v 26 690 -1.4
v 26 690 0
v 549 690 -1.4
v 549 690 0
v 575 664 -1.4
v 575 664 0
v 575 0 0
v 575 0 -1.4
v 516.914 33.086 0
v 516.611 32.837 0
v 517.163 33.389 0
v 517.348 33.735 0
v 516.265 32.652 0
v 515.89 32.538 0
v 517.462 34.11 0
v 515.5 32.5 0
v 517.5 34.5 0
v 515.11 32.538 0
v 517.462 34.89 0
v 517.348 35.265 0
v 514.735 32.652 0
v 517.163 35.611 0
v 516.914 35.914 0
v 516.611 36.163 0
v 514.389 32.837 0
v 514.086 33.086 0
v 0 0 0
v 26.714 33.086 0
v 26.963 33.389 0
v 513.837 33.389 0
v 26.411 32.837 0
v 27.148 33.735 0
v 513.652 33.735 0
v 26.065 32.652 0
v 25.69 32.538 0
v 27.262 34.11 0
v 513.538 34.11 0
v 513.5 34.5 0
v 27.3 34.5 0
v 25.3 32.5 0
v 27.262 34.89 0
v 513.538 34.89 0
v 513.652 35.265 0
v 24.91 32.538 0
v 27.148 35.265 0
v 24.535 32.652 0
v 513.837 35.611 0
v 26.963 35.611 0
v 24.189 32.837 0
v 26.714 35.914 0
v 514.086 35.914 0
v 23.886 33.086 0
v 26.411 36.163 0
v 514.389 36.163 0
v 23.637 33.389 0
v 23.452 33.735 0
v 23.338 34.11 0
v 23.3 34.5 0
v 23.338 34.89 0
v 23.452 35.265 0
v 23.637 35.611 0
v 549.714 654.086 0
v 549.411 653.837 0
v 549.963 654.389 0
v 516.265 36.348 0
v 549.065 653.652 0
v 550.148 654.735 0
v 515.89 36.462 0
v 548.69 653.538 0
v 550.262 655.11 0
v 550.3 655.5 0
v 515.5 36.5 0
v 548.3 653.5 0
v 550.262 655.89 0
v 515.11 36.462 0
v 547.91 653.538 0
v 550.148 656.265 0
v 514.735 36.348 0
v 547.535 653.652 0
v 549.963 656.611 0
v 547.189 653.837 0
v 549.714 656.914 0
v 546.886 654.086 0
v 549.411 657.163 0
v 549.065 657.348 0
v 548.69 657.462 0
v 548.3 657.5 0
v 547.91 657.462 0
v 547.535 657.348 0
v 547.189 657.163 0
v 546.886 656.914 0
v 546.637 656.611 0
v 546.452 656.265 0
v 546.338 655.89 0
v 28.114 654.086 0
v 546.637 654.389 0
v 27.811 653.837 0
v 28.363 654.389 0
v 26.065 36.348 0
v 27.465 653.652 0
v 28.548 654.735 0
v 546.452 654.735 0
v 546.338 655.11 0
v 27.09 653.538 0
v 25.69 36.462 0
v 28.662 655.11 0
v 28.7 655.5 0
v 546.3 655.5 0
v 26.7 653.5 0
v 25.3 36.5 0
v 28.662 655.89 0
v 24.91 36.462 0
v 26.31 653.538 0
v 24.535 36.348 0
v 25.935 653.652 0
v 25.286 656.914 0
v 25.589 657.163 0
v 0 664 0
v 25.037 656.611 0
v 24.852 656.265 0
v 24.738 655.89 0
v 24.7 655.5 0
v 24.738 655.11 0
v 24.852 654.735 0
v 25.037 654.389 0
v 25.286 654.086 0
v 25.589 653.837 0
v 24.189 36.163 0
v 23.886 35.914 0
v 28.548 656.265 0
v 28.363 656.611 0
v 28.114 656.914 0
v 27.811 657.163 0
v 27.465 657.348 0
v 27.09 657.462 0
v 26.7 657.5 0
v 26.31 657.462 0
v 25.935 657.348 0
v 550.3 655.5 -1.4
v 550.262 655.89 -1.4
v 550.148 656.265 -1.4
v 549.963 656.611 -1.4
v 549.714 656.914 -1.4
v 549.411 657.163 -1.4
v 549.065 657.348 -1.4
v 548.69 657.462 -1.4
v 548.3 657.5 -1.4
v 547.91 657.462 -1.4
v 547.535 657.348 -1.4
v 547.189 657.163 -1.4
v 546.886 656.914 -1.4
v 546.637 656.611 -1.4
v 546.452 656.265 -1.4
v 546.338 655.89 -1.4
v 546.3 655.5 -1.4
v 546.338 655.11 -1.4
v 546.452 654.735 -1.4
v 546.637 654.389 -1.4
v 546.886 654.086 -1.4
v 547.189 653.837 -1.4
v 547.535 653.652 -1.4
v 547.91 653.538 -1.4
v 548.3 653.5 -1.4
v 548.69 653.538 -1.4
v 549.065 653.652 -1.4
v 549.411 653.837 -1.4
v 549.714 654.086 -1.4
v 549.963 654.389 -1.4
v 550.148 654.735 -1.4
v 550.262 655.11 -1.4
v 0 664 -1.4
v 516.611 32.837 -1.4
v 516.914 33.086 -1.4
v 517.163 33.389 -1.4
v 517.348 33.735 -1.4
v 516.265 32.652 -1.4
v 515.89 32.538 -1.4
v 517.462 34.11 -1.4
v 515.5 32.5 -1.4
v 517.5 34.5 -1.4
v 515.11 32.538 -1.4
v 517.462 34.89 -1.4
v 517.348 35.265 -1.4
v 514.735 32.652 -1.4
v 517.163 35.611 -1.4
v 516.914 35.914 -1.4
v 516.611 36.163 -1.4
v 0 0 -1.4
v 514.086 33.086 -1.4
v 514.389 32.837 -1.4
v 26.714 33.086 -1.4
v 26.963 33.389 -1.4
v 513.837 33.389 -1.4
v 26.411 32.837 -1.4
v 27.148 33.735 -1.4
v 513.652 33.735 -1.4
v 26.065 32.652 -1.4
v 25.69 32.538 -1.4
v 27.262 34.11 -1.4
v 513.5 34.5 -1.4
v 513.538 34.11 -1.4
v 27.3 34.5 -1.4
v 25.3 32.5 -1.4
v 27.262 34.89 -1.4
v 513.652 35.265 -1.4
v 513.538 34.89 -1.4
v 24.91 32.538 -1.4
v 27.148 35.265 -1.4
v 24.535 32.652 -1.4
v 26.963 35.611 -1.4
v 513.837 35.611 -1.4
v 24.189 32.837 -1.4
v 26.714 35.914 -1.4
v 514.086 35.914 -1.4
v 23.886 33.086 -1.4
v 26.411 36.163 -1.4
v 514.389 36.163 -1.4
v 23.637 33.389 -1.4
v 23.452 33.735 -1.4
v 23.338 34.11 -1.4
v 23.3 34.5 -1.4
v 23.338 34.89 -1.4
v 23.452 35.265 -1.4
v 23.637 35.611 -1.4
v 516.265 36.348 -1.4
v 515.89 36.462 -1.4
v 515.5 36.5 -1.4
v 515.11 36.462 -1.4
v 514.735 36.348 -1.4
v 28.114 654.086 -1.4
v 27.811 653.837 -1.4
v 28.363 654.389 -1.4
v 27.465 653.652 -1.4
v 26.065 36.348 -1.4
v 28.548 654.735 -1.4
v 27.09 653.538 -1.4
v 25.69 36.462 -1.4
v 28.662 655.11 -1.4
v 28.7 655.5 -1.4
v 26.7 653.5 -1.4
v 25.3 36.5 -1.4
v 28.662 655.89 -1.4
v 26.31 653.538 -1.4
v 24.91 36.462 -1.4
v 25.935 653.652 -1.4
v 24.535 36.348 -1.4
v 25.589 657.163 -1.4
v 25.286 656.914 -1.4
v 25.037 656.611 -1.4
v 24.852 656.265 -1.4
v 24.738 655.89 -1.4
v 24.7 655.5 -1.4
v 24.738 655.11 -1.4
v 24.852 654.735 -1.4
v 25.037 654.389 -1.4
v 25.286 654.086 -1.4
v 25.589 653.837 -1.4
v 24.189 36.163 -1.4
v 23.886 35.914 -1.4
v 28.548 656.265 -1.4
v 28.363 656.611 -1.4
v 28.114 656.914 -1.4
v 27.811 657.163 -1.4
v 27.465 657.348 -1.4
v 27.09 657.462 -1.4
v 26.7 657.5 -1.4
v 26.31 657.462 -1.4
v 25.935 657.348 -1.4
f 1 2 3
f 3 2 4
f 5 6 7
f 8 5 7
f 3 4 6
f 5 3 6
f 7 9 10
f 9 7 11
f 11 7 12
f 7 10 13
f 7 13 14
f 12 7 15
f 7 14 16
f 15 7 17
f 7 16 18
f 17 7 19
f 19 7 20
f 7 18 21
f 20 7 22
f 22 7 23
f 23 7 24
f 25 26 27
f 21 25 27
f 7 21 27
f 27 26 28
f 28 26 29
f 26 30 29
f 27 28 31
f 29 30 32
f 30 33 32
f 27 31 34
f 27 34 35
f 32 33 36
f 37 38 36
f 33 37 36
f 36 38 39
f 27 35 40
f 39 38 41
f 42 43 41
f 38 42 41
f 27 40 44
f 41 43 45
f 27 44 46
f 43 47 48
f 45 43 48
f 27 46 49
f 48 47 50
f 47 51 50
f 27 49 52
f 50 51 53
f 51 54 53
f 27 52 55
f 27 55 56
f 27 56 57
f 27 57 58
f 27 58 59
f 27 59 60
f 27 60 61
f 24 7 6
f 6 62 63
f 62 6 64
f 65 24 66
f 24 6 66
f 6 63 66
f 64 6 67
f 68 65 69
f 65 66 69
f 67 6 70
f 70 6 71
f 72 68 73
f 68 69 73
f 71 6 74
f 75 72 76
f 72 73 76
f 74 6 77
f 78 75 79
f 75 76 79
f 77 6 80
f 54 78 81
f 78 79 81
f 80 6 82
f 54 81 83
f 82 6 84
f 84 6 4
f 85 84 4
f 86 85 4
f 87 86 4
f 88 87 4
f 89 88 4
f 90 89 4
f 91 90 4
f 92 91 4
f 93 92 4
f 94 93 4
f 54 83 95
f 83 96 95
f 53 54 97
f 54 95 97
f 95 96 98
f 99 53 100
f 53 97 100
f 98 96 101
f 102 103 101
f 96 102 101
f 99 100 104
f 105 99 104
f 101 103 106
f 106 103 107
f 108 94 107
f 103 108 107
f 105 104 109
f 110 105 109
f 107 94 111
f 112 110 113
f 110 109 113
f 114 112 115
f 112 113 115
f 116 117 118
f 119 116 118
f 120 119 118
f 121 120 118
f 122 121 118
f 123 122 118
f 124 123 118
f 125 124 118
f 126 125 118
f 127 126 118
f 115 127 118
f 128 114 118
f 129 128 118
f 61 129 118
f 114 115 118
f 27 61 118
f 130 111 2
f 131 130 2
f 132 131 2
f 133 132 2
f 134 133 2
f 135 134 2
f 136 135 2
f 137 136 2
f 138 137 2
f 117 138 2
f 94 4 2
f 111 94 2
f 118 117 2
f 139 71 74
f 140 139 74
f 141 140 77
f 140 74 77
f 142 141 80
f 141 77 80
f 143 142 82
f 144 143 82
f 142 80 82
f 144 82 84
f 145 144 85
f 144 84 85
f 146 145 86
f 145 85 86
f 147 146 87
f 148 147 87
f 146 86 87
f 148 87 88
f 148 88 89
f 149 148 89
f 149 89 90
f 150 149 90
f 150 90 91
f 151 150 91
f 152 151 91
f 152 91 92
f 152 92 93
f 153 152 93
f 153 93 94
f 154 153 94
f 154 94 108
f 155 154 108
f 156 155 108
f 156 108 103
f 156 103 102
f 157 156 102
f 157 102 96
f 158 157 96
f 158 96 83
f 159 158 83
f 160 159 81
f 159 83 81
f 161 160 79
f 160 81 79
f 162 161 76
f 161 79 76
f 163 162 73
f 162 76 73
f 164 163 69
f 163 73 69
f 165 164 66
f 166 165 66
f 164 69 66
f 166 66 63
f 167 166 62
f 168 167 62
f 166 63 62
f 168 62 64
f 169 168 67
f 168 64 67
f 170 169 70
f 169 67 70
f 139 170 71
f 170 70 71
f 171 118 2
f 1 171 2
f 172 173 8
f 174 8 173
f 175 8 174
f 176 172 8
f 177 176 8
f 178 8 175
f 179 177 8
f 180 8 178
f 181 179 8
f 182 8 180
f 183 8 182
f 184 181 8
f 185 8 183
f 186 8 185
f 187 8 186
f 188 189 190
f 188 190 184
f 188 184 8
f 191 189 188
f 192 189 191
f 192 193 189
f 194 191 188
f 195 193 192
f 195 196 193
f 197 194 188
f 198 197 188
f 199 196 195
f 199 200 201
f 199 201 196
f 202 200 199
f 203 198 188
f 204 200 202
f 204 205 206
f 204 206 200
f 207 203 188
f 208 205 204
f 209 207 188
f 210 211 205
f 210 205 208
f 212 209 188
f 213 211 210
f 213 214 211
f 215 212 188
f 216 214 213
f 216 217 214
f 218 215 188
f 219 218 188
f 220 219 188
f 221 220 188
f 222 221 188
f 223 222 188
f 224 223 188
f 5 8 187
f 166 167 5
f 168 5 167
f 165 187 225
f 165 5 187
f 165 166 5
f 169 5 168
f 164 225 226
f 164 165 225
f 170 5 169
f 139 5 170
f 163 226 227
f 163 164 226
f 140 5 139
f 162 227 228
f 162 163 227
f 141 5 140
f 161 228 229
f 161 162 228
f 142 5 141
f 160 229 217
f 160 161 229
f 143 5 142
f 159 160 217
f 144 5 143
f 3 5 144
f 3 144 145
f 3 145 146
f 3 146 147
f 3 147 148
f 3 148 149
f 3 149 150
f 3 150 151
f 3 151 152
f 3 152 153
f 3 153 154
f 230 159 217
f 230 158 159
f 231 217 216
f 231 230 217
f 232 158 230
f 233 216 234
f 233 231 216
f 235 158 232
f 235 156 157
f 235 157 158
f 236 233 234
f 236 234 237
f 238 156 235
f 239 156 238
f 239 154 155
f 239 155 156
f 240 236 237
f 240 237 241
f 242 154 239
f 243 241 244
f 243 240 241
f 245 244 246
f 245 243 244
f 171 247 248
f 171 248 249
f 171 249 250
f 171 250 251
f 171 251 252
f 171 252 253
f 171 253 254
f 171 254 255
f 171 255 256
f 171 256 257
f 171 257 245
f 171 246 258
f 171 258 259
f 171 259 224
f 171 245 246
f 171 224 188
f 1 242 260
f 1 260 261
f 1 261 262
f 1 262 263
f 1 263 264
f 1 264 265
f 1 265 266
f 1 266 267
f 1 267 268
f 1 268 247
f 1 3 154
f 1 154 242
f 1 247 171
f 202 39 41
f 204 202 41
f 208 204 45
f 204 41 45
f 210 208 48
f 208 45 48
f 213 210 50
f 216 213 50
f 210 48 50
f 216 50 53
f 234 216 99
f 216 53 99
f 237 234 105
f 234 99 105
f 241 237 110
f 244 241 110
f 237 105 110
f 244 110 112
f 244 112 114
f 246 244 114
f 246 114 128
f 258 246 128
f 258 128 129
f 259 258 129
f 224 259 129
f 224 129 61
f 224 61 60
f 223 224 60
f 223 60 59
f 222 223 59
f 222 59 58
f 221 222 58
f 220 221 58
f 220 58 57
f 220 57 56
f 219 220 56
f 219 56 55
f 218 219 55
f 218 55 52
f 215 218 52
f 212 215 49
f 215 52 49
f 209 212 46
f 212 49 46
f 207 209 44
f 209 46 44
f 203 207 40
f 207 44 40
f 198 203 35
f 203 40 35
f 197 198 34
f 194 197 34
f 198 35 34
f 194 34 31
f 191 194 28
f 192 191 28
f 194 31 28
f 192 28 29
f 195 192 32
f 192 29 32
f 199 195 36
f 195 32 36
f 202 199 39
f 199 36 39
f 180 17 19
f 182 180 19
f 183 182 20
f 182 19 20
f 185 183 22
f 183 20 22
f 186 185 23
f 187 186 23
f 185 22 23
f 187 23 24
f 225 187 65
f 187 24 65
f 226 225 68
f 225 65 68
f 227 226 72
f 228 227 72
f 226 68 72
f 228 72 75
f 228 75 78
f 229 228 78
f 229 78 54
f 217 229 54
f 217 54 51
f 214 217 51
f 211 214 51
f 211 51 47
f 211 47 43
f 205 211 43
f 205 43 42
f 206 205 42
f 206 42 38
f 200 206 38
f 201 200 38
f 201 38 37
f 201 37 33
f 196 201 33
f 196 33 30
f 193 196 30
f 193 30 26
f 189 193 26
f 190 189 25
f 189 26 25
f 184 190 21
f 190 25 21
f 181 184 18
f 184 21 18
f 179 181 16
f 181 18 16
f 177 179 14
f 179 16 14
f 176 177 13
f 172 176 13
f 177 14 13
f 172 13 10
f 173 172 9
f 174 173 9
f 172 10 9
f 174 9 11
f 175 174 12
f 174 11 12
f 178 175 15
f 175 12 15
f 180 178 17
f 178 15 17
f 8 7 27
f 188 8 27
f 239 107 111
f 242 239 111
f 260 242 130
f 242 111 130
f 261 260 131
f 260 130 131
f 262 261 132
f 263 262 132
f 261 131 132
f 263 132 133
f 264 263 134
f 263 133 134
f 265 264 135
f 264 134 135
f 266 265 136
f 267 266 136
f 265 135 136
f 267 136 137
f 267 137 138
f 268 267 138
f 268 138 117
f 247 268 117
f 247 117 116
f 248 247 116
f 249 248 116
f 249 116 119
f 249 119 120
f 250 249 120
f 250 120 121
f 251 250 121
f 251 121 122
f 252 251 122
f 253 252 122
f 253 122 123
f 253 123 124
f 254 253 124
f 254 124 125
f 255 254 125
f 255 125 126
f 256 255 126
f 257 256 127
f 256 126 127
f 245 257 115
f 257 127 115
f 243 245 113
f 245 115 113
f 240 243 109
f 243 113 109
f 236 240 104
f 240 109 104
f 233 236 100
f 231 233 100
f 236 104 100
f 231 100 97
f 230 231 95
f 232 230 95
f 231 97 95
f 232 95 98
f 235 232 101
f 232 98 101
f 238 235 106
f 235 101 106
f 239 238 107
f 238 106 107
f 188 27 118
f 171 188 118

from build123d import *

# Parameters (mm, degrees)
BASE_FLANGE1_DEPTH = 1.4
CUT_EXTRUDE1_REACH = 900.18
SKETCH6_R          = 2


# Sheet-metal steps are written as plain solids
with BuildPart() as part:
    # Sketch1 → Base-Flange1 (new body)
    with BuildSketch(Plane.XY):
        Polygon((0, 664), (26, 690), (549, 690), (575, 664), (575, 0), (0, 0), align=None)
    extrude(amount=-BASE_FLANGE1_DEPTH)

    # Sketch6 → Cut-Extrude1 (cut, up to next)
    with BuildSketch(Plane.XY, mode=Mode.PRIVATE) as cut_extrude1_sk1:
        with Locations((26.7, 655.5)):
            Circle(SKETCH6_R)
    cut_extrude1_tool1 = extrude(cut_extrude1_sk1.sketch, amount=-CUT_EXTRUDE1_REACH, mode=Mode.PRIVATE) & part.part
    # Sketch6 → Cut-Extrude1 (cut, up to next)
    with BuildSketch(Plane.XY, mode=Mode.PRIVATE) as cut_extrude1_sk2:
        with Locations((548.3, 655.5)):
            Circle(SKETCH6_R)
    cut_extrude1_tool2 = extrude(cut_extrude1_sk2.sketch, amount=-CUT_EXTRUDE1_REACH, mode=Mode.PRIVATE) & part.part
    # Sketch6 → Cut-Extrude1 (cut, up to next)
    with BuildSketch(Plane.XY, mode=Mode.PRIVATE) as cut_extrude1_sk3:
        with Locations((25.3, 34.5)):
            Circle(SKETCH6_R)
    cut_extrude1_tool3 = extrude(cut_extrude1_sk3.sketch, amount=-CUT_EXTRUDE1_REACH, mode=Mode.PRIVATE) & part.part
    # Sketch6 → Cut-Extrude1 (cut, up to next)
    with BuildSketch(Plane.XY, mode=Mode.PRIVATE) as cut_extrude1_sk4:
        with Locations((515.5, 34.5)):
            Circle(SKETCH6_R)
    cut_extrude1_tool4 = extrude(cut_extrude1_sk4.sketch, amount=-CUT_EXTRUDE1_REACH, mode=Mode.PRIVATE) & part.part
    add(cut_extrude1_tool1.solids().sort_by_distance((26.7, 655.5, 0))[0], mode=Mode.SUBTRACT)
    add(cut_extrude1_tool2.solids().sort_by_distance((548.3, 655.5, 0))[0], mode=Mode.SUBTRACT)
    add(cut_extrude1_tool3.solids().sort_by_distance((25.3, 34.5, 0))[0], mode=Mode.SUBTRACT)
    add(cut_extrude1_tool4.solids().sort_by_distance((515.5, 34.5, 0))[0], mode=Mode.SUBTRACT)


solid = part.part
